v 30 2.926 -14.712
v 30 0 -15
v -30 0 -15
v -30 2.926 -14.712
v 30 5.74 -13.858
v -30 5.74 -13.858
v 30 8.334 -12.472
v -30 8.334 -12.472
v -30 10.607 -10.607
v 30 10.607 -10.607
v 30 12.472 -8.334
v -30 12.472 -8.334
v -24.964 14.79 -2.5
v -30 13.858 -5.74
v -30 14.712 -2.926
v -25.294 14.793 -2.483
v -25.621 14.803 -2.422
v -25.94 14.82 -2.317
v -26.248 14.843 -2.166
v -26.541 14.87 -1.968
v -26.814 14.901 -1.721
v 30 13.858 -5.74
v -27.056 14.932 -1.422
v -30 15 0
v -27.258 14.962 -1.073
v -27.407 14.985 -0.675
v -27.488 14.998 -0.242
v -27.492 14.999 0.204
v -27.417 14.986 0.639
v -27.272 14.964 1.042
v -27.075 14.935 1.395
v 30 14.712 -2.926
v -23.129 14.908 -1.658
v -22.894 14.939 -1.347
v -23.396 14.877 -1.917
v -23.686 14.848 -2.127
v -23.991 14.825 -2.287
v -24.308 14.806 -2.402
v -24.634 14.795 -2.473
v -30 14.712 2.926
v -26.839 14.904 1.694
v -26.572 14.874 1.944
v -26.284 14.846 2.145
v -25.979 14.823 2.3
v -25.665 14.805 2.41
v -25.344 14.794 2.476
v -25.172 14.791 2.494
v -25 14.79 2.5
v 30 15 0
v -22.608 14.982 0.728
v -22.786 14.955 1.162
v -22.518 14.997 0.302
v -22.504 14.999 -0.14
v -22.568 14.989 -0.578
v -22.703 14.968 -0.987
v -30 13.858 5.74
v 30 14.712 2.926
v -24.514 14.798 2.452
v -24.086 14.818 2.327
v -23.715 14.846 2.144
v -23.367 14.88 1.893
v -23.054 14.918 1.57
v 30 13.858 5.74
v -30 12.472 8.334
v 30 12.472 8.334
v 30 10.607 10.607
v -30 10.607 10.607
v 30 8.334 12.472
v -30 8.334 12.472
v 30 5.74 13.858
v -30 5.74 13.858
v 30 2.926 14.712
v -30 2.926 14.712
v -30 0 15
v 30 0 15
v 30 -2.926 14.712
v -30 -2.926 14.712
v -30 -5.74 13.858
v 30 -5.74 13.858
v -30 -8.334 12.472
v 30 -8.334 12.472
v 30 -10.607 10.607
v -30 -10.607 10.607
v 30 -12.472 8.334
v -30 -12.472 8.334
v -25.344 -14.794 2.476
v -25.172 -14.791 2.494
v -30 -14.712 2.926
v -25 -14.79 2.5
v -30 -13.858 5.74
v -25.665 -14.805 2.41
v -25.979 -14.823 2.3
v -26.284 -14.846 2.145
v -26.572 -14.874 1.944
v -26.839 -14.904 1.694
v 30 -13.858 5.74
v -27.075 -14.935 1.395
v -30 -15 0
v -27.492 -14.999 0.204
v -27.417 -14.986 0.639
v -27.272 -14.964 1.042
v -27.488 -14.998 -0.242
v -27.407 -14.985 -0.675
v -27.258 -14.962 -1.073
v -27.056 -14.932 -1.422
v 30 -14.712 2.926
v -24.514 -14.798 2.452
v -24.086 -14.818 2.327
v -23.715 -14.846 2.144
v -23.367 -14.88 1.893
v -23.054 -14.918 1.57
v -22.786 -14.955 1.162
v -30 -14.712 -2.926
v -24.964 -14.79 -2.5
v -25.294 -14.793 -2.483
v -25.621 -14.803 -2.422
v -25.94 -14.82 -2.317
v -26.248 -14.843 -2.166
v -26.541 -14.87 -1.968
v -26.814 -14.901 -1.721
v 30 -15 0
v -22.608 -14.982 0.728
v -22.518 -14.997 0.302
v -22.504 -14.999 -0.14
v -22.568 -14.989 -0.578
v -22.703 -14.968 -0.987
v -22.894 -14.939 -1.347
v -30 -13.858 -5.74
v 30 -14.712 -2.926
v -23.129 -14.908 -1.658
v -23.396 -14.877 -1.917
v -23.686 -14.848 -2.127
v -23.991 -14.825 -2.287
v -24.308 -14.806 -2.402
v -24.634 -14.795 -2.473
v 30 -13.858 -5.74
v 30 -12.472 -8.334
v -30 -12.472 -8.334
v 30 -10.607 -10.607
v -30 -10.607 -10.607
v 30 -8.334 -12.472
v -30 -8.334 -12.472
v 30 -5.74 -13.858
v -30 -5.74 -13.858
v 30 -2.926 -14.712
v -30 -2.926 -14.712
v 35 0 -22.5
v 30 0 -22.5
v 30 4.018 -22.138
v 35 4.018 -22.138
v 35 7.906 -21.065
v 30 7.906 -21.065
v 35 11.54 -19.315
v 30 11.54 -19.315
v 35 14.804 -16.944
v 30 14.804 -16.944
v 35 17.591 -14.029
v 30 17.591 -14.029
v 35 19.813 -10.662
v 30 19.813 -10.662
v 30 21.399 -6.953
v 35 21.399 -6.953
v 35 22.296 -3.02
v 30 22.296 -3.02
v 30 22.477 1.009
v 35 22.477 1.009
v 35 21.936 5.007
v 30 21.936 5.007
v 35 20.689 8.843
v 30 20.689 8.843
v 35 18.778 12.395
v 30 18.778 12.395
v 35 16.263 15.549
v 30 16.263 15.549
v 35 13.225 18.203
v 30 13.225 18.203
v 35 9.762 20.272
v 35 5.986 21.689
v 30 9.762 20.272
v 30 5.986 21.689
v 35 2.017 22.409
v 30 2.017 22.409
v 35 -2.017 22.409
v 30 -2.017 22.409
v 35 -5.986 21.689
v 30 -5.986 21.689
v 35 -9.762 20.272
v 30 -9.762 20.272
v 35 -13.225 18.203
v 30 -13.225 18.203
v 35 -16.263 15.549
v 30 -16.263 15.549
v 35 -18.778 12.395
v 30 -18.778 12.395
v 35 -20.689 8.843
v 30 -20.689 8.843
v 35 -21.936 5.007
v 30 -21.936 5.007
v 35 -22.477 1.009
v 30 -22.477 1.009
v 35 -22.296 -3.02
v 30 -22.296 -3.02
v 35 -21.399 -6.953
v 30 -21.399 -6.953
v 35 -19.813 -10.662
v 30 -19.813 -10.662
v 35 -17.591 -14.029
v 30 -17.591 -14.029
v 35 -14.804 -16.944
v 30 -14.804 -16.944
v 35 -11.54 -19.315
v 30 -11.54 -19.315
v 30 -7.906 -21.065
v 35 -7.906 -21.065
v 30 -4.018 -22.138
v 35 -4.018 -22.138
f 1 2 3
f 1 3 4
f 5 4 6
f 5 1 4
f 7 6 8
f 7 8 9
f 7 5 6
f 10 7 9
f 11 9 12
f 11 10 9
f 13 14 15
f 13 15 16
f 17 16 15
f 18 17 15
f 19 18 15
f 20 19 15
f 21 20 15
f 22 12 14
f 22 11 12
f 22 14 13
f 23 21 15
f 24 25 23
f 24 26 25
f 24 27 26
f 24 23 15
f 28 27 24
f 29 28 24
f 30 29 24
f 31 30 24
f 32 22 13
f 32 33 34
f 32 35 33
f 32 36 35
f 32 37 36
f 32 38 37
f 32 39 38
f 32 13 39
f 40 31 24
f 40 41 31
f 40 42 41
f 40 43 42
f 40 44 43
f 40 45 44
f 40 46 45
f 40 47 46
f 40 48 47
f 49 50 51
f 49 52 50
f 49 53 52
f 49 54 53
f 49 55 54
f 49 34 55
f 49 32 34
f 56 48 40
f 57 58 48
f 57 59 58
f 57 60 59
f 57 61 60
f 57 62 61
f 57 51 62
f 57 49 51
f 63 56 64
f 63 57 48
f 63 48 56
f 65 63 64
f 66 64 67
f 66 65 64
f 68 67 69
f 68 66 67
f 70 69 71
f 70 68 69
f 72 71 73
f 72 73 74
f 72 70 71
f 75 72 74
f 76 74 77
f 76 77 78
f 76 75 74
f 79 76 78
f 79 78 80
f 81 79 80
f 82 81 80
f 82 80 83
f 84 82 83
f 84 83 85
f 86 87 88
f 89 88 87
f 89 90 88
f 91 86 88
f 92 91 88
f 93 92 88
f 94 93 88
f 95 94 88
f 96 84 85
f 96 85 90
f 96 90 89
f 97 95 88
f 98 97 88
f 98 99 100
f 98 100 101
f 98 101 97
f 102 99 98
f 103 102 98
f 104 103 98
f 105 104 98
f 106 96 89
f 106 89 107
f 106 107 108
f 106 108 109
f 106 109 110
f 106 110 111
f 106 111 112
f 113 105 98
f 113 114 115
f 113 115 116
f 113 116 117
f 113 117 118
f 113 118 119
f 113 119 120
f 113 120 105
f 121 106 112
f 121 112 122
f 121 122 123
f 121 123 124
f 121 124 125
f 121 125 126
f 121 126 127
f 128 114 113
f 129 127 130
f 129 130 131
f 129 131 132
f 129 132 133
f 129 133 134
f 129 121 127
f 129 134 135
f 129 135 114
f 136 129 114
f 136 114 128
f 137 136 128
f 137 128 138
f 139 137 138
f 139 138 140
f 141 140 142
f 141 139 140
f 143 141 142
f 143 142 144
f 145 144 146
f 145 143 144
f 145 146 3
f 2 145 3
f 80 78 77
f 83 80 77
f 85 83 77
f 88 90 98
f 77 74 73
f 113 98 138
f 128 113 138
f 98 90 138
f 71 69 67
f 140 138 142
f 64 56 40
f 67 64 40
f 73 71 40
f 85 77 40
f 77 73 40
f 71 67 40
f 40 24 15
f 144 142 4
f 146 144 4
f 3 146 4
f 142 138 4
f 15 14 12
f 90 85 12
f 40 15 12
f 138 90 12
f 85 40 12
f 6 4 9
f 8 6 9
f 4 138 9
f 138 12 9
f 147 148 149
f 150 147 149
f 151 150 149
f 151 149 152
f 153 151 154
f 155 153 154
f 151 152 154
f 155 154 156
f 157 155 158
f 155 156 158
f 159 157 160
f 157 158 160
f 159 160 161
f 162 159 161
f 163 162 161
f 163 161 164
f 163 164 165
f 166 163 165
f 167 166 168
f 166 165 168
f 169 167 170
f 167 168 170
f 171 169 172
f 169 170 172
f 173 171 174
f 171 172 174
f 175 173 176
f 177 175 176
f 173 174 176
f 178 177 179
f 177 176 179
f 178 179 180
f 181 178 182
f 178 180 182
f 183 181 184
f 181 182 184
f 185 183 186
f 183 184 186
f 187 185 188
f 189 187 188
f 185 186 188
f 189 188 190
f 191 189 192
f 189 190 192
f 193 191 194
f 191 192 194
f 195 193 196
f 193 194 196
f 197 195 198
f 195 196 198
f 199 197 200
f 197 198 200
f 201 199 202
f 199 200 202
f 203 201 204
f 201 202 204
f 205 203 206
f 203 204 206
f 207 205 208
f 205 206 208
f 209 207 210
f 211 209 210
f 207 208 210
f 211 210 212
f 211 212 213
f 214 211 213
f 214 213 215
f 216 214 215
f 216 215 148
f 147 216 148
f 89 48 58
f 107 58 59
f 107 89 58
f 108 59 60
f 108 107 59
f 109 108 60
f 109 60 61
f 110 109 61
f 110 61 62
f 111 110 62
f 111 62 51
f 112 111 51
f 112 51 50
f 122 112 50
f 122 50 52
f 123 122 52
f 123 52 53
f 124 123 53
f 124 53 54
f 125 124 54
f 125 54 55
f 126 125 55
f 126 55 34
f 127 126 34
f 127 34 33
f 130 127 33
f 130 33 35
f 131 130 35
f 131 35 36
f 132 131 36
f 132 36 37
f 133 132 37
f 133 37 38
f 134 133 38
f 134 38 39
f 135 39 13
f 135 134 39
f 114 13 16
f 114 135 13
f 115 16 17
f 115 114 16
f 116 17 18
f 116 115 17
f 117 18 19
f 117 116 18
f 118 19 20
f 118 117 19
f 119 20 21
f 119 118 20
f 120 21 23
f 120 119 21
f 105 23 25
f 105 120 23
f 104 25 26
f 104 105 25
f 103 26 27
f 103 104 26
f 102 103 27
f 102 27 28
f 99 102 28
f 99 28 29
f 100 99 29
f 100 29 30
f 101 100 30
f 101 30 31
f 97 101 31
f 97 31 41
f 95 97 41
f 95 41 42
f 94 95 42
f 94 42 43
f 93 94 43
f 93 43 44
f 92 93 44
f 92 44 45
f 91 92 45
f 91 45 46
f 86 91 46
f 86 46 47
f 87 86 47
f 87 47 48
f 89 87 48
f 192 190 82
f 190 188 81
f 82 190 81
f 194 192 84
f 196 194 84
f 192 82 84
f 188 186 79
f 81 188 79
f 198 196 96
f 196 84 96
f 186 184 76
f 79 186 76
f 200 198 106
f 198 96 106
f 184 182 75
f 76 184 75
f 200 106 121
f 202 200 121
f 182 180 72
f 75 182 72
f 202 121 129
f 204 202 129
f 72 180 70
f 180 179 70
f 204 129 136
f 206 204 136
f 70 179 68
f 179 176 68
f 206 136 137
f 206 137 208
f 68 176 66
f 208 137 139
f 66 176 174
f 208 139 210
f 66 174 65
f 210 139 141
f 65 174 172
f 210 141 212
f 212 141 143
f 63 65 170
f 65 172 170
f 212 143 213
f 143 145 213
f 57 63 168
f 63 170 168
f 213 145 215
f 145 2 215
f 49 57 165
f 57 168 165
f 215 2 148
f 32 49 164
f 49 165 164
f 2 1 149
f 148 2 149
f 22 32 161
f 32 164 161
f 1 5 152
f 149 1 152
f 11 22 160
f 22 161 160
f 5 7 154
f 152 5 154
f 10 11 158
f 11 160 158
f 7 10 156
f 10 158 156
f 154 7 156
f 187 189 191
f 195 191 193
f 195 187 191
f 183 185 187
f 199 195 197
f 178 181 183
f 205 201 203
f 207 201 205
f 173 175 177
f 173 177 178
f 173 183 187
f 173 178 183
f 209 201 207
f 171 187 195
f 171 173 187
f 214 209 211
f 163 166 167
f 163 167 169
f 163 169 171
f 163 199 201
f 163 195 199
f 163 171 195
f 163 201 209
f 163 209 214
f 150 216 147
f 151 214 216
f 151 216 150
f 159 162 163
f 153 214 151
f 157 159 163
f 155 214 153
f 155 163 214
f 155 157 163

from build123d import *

# Parameters (mm, degrees)
SKETCH1_R               = 15
BOSS_EXTRUDE1_DEPTH     = 30
SKETCH2_R               = 22.5
BOSS_EXTRUDE2_DEPTH     = 5
CUT_EXTRUDE1_DEPTH      = 48.302219821
CUT_EXTRUDE1_DEPTH_BACK = 48.302219821
SKETCH3_R               = 2.5


with BuildPart() as part:
    # Sketch1 → Boss-Extrude1 (new, symmetric)
    with BuildSketch(Plane(origin=(0, 0, 0), x_dir=(0, 0, -1), z_dir=(1, 0, 0))):
        Circle(SKETCH1_R)
    extrude(amount=BOSS_EXTRUDE1_DEPTH, both=True)

    # Sketch2 → Boss-Extrude2 (add)
    with BuildSketch(Plane(origin=(30, 0, 0), x_dir=(0, 0, -1), z_dir=(1, 0, 0))):
        Circle(SKETCH2_R)
    extrude(amount=BOSS_EXTRUDE2_DEPTH)

    # Sketch3 → Cut-Extrude1 (cut, two sides: drawn at the far end of the back side and taken through both)
    with BuildSketch(Plane(origin=(0, 0, 0), x_dir=(1, 0, 0), z_dir=(0, 1, 0)).offset(-CUT_EXTRUDE1_DEPTH_BACK)):
        with Locations(Location((-25, 0, 0), (0, 0, 270))):
            Circle(SKETCH3_R)
    extrude(amount=CUT_EXTRUDE1_DEPTH + CUT_EXTRUDE1_DEPTH_BACK, mode=Mode.SUBTRACT)


solid = part.part
